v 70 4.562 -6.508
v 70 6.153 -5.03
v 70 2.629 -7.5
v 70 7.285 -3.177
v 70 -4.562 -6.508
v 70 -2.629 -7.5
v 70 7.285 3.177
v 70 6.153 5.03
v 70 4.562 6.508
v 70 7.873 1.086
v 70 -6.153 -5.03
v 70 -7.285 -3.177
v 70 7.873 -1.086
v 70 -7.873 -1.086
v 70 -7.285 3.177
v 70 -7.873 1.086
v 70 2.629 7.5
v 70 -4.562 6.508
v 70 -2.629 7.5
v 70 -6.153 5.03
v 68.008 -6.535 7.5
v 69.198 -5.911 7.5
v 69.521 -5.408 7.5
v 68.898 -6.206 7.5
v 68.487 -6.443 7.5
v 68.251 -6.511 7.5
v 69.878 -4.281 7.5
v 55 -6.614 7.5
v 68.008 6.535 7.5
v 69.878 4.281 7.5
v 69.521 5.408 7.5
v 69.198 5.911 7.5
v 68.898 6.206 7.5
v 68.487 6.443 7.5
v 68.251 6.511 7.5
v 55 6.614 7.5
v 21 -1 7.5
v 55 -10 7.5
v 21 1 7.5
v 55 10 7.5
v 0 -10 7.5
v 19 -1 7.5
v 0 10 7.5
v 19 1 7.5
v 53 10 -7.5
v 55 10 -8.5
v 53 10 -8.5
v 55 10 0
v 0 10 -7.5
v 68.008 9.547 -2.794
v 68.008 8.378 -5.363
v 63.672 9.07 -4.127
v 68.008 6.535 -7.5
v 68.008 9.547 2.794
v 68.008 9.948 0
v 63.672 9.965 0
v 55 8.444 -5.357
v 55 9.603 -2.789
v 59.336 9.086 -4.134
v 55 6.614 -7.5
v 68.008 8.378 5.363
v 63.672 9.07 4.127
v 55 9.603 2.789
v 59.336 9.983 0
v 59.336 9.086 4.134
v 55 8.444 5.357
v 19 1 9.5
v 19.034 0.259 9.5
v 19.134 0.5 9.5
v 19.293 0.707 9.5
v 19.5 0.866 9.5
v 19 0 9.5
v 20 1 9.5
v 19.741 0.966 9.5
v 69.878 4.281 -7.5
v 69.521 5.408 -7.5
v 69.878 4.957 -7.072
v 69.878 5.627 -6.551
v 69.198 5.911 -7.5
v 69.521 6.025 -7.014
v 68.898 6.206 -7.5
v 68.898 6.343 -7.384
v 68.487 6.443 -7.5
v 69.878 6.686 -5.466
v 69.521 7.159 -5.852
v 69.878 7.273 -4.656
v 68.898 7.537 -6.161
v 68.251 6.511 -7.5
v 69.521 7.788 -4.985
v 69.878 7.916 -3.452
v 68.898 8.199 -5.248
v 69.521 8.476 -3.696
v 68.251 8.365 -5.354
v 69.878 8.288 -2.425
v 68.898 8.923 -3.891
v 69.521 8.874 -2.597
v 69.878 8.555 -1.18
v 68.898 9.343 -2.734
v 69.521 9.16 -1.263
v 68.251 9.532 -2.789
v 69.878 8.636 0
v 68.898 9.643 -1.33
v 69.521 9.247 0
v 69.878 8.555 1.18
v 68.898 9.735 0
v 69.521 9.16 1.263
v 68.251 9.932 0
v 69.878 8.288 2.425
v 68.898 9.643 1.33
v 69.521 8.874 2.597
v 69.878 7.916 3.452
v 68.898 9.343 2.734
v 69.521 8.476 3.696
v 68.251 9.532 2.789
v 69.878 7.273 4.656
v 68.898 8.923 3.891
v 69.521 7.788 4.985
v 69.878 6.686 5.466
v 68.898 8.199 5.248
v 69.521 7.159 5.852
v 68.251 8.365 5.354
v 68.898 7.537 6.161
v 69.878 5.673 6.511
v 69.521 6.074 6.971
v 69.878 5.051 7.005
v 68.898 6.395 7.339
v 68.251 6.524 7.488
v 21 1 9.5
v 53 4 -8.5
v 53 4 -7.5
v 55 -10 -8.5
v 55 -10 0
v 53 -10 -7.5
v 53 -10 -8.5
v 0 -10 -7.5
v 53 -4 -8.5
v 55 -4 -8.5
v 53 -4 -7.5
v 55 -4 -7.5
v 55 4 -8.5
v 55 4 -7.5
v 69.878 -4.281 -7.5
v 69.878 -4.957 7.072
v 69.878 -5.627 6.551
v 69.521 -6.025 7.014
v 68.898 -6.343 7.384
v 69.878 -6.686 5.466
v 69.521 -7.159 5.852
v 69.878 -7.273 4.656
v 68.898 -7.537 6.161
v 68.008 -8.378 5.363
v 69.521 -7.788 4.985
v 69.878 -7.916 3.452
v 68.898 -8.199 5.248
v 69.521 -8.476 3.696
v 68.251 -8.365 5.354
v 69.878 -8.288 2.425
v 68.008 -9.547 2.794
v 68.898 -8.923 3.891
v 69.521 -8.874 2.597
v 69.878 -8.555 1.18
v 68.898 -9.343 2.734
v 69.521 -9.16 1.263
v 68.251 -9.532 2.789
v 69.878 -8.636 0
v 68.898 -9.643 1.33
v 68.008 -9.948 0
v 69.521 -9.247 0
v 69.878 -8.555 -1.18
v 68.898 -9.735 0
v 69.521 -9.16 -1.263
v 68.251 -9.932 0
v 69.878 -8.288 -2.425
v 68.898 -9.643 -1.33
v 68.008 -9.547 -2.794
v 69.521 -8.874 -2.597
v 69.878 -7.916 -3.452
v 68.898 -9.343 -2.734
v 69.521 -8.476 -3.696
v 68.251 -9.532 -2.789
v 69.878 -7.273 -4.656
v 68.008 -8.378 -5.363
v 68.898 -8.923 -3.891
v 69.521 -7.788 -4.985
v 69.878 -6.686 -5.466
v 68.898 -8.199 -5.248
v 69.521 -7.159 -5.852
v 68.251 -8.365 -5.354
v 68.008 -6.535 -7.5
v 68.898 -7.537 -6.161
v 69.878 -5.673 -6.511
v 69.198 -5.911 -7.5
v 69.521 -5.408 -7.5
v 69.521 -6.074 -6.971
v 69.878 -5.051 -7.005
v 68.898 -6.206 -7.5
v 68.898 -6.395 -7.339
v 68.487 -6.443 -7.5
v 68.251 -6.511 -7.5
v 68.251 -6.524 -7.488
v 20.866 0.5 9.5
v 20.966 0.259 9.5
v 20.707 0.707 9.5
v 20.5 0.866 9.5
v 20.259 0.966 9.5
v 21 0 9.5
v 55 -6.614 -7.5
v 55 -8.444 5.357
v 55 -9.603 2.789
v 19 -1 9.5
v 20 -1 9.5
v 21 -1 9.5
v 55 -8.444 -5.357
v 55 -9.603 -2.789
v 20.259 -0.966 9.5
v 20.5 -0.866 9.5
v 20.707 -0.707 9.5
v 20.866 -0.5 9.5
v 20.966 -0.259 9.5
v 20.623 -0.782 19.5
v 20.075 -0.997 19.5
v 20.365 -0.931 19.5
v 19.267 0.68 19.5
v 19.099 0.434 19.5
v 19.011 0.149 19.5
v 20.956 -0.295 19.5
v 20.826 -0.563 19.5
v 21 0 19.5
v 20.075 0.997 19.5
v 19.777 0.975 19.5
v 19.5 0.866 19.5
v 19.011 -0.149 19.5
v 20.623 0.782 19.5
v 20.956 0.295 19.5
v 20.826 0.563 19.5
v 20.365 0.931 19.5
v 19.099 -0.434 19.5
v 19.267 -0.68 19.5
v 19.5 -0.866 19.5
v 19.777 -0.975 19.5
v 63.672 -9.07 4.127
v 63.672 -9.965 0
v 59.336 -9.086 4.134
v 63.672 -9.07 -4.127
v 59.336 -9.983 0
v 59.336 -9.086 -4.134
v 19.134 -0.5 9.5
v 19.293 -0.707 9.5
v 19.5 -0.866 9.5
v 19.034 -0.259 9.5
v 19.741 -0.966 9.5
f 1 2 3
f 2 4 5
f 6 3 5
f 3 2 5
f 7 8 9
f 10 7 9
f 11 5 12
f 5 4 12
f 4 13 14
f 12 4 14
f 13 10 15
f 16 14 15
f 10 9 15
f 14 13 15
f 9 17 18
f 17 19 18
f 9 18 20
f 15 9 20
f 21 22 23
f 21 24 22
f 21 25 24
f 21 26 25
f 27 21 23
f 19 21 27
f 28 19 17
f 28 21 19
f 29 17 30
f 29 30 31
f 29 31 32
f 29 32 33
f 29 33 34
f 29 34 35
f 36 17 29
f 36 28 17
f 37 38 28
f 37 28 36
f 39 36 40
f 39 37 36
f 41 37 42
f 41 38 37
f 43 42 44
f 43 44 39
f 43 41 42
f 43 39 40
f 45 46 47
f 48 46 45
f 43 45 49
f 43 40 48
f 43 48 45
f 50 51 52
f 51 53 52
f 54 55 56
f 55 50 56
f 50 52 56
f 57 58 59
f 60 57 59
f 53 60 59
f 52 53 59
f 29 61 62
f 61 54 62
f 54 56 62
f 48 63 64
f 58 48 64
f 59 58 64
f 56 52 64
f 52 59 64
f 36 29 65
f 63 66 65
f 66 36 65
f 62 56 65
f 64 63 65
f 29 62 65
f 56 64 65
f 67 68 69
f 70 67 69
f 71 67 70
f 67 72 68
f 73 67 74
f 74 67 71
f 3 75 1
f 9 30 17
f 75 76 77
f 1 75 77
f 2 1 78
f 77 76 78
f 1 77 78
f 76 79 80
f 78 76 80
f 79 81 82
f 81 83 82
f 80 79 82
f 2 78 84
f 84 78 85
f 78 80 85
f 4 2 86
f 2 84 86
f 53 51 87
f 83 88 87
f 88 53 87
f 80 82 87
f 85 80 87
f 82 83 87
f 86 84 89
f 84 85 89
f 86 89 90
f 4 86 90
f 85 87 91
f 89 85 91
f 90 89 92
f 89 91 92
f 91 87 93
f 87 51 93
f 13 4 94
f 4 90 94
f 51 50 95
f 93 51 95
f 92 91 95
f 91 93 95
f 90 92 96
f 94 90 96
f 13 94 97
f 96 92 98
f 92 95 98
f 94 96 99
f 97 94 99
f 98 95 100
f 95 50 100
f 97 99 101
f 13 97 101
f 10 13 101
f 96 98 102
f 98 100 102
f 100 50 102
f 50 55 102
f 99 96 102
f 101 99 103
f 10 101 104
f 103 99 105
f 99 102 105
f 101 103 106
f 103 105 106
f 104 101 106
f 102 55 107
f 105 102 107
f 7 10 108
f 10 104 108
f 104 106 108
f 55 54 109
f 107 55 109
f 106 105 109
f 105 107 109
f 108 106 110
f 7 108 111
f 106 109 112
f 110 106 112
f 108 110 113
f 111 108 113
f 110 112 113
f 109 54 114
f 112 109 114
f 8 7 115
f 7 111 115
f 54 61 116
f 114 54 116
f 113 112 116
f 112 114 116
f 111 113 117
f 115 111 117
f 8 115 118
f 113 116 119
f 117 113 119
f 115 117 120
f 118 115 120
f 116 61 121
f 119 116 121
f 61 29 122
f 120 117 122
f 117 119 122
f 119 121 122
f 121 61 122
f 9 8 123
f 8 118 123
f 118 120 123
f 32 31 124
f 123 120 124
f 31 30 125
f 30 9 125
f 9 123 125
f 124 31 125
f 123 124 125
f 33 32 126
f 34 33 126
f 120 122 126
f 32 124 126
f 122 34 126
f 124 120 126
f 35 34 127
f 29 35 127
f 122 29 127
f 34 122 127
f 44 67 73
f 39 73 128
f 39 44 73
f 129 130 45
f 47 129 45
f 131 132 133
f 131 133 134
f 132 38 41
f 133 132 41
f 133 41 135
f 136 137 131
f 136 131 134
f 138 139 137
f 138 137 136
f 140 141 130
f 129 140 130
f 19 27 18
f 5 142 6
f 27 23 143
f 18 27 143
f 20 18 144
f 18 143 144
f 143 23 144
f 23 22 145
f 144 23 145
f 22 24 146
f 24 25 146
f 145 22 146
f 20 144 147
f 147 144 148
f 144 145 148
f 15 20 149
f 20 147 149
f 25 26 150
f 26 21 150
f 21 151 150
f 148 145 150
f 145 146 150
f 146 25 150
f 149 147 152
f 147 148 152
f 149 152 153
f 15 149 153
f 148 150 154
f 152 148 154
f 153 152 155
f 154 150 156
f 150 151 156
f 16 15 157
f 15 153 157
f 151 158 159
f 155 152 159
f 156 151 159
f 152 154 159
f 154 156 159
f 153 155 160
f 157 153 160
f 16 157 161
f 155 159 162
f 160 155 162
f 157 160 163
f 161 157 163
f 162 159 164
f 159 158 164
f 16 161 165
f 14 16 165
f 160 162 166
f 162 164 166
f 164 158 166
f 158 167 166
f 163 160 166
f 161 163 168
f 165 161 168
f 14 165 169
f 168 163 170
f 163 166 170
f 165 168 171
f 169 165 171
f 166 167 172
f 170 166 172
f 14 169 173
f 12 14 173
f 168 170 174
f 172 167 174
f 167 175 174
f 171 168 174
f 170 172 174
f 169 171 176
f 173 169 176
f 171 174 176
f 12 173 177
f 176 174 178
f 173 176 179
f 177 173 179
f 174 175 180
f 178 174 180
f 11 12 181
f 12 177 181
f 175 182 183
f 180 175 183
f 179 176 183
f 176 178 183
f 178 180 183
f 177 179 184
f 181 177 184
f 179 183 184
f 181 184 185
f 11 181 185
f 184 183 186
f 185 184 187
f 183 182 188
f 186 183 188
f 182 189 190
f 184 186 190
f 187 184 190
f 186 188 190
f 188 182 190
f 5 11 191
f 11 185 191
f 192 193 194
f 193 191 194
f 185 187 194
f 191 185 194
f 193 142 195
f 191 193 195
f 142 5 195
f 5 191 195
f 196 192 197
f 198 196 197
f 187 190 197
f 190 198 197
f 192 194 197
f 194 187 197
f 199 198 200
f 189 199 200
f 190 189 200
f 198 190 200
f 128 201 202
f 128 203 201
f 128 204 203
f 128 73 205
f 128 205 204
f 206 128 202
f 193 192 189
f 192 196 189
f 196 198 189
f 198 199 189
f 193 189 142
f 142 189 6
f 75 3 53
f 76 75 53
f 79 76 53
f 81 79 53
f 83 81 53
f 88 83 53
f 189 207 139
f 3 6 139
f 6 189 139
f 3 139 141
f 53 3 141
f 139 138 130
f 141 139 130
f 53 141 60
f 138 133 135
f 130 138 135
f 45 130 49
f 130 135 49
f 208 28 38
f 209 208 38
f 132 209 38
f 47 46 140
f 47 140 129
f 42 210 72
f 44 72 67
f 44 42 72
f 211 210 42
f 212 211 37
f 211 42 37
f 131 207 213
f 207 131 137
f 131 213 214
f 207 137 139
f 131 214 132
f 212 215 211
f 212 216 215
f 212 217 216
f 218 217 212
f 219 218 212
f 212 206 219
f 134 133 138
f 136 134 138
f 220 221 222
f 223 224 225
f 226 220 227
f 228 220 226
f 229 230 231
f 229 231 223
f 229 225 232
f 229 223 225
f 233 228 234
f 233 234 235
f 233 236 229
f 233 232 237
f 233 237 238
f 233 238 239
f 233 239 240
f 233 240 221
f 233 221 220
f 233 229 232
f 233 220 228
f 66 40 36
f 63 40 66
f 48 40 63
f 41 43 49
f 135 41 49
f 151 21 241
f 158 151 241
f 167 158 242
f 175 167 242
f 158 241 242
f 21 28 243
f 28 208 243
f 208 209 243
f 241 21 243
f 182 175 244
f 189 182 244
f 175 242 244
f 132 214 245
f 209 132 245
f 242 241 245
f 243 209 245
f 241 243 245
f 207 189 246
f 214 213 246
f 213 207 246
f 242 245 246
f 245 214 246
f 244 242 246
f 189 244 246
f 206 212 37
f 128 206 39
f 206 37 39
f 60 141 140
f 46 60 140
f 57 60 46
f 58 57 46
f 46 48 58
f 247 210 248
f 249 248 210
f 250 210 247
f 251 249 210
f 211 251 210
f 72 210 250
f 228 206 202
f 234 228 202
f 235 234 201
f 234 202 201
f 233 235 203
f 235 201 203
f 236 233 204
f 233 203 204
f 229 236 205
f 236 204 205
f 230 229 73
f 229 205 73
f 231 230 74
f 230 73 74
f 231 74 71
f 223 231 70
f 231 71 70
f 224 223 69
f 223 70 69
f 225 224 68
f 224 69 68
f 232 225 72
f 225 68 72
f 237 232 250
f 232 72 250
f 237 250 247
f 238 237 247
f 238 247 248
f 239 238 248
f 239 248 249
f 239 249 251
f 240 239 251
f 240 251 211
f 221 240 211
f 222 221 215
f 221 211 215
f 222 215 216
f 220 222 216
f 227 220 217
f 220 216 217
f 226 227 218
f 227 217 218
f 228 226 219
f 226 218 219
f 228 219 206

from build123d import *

# Parameters (mm, degrees)
SKETCH_1_W          = 15
SKETCH_1_H          = 20
EXTRUDE_1_DEPTH     = 55
SKETCH_3_W          = 2
SKETCH_3_H          = 6
EXTRUDE_2_DEPTH     = 1
SKETCH_4_W          = 2
SKETCH_4_H          = 2
EXTRUDE_3_DEPTH     = 2
SKETCH_5_W          = 6.633447251
SKETCH_5_H          = 20.27238771
SKETCH_5_W_2        = 12.16711561
SKETCH_5_H_2        = 23.052373823
CUT_EXTRUDE_1_DEPTH = 24
SKETCH_6_R          = 1
EXTRUDE_4_DEPTH     = 10


with BuildPart() as part:
    # 草图1 → 凸台-拉伸1 (new body)
    with BuildSketch(Plane(origin=(0, 0, 0), x_dir=(0, 0, -1), z_dir=(1, 0, 0))):
        Rectangle(SKETCH_1_W, SKETCH_1_H)
    extrude(amount=EXTRUDE_1_DEPTH)

    # 草图2 → 旋转1 (revolve)
    with BuildSketch(Plane.XY):
        with BuildLine():
            Line((55, 0), (70, 0))
            Line((70, 0), (70, 7.947586675))
            ThreePointArc((70, 7.947586675), (69.417060699, 9.358947358), (68.008061024, 9.94757043))
            Line((68.008061024, 9.94757043), (55, 10))
            Line((55, 10), (55, 0))
        make_face()
    revolve(axis=Axis((55, 0, 0), (1, 0, 0)))

    # 草图3 → 凸台-拉伸2 (add)
    with BuildSketch(Plane(origin=(0, 0, -7.5), x_dir=(-1, 0, 0), z_dir=(0, 0, -1))):
        with Locations((-54, 7)):
            Rectangle(SKETCH_3_W, SKETCH_3_H)
        with Locations((-54, -7)):
            Rectangle(SKETCH_3_W, SKETCH_3_H)
    extrude(amount=EXTRUDE_2_DEPTH)

    # 草图4 → 凸台-拉伸3 (add)
    with BuildSketch(Plane.XY.offset(7.5)):
        with Locations((20, 0)):
            Rectangle(SKETCH_4_W, SKETCH_4_H)
    extrude(amount=EXTRUDE_3_DEPTH)

    # 草图5 → 切除-拉伸1 (cut)
    with BuildSketch(Plane.ZY.offset(-55)):
        with Locations((-10.816723626, -0.136193855)):
            Rectangle(SKETCH_5_W, SKETCH_5_H)
        with Locations((13.583557805, -1.526186911)):
            Rectangle(SKETCH_5_W_2, SKETCH_5_H_2)
    extrude(amount=-CUT_EXTRUDE_1_DEPTH, mode=Mode.SUBTRACT)

    # 草图6 → 凸台-拉伸4 (add)
    with BuildSketch(Plane.XY.offset(9.5)):
        with Locations((20, 0)):
            Circle(SKETCH_6_R)
    extrude(amount=EXTRUDE_4_DEPTH)


solid = part.part
